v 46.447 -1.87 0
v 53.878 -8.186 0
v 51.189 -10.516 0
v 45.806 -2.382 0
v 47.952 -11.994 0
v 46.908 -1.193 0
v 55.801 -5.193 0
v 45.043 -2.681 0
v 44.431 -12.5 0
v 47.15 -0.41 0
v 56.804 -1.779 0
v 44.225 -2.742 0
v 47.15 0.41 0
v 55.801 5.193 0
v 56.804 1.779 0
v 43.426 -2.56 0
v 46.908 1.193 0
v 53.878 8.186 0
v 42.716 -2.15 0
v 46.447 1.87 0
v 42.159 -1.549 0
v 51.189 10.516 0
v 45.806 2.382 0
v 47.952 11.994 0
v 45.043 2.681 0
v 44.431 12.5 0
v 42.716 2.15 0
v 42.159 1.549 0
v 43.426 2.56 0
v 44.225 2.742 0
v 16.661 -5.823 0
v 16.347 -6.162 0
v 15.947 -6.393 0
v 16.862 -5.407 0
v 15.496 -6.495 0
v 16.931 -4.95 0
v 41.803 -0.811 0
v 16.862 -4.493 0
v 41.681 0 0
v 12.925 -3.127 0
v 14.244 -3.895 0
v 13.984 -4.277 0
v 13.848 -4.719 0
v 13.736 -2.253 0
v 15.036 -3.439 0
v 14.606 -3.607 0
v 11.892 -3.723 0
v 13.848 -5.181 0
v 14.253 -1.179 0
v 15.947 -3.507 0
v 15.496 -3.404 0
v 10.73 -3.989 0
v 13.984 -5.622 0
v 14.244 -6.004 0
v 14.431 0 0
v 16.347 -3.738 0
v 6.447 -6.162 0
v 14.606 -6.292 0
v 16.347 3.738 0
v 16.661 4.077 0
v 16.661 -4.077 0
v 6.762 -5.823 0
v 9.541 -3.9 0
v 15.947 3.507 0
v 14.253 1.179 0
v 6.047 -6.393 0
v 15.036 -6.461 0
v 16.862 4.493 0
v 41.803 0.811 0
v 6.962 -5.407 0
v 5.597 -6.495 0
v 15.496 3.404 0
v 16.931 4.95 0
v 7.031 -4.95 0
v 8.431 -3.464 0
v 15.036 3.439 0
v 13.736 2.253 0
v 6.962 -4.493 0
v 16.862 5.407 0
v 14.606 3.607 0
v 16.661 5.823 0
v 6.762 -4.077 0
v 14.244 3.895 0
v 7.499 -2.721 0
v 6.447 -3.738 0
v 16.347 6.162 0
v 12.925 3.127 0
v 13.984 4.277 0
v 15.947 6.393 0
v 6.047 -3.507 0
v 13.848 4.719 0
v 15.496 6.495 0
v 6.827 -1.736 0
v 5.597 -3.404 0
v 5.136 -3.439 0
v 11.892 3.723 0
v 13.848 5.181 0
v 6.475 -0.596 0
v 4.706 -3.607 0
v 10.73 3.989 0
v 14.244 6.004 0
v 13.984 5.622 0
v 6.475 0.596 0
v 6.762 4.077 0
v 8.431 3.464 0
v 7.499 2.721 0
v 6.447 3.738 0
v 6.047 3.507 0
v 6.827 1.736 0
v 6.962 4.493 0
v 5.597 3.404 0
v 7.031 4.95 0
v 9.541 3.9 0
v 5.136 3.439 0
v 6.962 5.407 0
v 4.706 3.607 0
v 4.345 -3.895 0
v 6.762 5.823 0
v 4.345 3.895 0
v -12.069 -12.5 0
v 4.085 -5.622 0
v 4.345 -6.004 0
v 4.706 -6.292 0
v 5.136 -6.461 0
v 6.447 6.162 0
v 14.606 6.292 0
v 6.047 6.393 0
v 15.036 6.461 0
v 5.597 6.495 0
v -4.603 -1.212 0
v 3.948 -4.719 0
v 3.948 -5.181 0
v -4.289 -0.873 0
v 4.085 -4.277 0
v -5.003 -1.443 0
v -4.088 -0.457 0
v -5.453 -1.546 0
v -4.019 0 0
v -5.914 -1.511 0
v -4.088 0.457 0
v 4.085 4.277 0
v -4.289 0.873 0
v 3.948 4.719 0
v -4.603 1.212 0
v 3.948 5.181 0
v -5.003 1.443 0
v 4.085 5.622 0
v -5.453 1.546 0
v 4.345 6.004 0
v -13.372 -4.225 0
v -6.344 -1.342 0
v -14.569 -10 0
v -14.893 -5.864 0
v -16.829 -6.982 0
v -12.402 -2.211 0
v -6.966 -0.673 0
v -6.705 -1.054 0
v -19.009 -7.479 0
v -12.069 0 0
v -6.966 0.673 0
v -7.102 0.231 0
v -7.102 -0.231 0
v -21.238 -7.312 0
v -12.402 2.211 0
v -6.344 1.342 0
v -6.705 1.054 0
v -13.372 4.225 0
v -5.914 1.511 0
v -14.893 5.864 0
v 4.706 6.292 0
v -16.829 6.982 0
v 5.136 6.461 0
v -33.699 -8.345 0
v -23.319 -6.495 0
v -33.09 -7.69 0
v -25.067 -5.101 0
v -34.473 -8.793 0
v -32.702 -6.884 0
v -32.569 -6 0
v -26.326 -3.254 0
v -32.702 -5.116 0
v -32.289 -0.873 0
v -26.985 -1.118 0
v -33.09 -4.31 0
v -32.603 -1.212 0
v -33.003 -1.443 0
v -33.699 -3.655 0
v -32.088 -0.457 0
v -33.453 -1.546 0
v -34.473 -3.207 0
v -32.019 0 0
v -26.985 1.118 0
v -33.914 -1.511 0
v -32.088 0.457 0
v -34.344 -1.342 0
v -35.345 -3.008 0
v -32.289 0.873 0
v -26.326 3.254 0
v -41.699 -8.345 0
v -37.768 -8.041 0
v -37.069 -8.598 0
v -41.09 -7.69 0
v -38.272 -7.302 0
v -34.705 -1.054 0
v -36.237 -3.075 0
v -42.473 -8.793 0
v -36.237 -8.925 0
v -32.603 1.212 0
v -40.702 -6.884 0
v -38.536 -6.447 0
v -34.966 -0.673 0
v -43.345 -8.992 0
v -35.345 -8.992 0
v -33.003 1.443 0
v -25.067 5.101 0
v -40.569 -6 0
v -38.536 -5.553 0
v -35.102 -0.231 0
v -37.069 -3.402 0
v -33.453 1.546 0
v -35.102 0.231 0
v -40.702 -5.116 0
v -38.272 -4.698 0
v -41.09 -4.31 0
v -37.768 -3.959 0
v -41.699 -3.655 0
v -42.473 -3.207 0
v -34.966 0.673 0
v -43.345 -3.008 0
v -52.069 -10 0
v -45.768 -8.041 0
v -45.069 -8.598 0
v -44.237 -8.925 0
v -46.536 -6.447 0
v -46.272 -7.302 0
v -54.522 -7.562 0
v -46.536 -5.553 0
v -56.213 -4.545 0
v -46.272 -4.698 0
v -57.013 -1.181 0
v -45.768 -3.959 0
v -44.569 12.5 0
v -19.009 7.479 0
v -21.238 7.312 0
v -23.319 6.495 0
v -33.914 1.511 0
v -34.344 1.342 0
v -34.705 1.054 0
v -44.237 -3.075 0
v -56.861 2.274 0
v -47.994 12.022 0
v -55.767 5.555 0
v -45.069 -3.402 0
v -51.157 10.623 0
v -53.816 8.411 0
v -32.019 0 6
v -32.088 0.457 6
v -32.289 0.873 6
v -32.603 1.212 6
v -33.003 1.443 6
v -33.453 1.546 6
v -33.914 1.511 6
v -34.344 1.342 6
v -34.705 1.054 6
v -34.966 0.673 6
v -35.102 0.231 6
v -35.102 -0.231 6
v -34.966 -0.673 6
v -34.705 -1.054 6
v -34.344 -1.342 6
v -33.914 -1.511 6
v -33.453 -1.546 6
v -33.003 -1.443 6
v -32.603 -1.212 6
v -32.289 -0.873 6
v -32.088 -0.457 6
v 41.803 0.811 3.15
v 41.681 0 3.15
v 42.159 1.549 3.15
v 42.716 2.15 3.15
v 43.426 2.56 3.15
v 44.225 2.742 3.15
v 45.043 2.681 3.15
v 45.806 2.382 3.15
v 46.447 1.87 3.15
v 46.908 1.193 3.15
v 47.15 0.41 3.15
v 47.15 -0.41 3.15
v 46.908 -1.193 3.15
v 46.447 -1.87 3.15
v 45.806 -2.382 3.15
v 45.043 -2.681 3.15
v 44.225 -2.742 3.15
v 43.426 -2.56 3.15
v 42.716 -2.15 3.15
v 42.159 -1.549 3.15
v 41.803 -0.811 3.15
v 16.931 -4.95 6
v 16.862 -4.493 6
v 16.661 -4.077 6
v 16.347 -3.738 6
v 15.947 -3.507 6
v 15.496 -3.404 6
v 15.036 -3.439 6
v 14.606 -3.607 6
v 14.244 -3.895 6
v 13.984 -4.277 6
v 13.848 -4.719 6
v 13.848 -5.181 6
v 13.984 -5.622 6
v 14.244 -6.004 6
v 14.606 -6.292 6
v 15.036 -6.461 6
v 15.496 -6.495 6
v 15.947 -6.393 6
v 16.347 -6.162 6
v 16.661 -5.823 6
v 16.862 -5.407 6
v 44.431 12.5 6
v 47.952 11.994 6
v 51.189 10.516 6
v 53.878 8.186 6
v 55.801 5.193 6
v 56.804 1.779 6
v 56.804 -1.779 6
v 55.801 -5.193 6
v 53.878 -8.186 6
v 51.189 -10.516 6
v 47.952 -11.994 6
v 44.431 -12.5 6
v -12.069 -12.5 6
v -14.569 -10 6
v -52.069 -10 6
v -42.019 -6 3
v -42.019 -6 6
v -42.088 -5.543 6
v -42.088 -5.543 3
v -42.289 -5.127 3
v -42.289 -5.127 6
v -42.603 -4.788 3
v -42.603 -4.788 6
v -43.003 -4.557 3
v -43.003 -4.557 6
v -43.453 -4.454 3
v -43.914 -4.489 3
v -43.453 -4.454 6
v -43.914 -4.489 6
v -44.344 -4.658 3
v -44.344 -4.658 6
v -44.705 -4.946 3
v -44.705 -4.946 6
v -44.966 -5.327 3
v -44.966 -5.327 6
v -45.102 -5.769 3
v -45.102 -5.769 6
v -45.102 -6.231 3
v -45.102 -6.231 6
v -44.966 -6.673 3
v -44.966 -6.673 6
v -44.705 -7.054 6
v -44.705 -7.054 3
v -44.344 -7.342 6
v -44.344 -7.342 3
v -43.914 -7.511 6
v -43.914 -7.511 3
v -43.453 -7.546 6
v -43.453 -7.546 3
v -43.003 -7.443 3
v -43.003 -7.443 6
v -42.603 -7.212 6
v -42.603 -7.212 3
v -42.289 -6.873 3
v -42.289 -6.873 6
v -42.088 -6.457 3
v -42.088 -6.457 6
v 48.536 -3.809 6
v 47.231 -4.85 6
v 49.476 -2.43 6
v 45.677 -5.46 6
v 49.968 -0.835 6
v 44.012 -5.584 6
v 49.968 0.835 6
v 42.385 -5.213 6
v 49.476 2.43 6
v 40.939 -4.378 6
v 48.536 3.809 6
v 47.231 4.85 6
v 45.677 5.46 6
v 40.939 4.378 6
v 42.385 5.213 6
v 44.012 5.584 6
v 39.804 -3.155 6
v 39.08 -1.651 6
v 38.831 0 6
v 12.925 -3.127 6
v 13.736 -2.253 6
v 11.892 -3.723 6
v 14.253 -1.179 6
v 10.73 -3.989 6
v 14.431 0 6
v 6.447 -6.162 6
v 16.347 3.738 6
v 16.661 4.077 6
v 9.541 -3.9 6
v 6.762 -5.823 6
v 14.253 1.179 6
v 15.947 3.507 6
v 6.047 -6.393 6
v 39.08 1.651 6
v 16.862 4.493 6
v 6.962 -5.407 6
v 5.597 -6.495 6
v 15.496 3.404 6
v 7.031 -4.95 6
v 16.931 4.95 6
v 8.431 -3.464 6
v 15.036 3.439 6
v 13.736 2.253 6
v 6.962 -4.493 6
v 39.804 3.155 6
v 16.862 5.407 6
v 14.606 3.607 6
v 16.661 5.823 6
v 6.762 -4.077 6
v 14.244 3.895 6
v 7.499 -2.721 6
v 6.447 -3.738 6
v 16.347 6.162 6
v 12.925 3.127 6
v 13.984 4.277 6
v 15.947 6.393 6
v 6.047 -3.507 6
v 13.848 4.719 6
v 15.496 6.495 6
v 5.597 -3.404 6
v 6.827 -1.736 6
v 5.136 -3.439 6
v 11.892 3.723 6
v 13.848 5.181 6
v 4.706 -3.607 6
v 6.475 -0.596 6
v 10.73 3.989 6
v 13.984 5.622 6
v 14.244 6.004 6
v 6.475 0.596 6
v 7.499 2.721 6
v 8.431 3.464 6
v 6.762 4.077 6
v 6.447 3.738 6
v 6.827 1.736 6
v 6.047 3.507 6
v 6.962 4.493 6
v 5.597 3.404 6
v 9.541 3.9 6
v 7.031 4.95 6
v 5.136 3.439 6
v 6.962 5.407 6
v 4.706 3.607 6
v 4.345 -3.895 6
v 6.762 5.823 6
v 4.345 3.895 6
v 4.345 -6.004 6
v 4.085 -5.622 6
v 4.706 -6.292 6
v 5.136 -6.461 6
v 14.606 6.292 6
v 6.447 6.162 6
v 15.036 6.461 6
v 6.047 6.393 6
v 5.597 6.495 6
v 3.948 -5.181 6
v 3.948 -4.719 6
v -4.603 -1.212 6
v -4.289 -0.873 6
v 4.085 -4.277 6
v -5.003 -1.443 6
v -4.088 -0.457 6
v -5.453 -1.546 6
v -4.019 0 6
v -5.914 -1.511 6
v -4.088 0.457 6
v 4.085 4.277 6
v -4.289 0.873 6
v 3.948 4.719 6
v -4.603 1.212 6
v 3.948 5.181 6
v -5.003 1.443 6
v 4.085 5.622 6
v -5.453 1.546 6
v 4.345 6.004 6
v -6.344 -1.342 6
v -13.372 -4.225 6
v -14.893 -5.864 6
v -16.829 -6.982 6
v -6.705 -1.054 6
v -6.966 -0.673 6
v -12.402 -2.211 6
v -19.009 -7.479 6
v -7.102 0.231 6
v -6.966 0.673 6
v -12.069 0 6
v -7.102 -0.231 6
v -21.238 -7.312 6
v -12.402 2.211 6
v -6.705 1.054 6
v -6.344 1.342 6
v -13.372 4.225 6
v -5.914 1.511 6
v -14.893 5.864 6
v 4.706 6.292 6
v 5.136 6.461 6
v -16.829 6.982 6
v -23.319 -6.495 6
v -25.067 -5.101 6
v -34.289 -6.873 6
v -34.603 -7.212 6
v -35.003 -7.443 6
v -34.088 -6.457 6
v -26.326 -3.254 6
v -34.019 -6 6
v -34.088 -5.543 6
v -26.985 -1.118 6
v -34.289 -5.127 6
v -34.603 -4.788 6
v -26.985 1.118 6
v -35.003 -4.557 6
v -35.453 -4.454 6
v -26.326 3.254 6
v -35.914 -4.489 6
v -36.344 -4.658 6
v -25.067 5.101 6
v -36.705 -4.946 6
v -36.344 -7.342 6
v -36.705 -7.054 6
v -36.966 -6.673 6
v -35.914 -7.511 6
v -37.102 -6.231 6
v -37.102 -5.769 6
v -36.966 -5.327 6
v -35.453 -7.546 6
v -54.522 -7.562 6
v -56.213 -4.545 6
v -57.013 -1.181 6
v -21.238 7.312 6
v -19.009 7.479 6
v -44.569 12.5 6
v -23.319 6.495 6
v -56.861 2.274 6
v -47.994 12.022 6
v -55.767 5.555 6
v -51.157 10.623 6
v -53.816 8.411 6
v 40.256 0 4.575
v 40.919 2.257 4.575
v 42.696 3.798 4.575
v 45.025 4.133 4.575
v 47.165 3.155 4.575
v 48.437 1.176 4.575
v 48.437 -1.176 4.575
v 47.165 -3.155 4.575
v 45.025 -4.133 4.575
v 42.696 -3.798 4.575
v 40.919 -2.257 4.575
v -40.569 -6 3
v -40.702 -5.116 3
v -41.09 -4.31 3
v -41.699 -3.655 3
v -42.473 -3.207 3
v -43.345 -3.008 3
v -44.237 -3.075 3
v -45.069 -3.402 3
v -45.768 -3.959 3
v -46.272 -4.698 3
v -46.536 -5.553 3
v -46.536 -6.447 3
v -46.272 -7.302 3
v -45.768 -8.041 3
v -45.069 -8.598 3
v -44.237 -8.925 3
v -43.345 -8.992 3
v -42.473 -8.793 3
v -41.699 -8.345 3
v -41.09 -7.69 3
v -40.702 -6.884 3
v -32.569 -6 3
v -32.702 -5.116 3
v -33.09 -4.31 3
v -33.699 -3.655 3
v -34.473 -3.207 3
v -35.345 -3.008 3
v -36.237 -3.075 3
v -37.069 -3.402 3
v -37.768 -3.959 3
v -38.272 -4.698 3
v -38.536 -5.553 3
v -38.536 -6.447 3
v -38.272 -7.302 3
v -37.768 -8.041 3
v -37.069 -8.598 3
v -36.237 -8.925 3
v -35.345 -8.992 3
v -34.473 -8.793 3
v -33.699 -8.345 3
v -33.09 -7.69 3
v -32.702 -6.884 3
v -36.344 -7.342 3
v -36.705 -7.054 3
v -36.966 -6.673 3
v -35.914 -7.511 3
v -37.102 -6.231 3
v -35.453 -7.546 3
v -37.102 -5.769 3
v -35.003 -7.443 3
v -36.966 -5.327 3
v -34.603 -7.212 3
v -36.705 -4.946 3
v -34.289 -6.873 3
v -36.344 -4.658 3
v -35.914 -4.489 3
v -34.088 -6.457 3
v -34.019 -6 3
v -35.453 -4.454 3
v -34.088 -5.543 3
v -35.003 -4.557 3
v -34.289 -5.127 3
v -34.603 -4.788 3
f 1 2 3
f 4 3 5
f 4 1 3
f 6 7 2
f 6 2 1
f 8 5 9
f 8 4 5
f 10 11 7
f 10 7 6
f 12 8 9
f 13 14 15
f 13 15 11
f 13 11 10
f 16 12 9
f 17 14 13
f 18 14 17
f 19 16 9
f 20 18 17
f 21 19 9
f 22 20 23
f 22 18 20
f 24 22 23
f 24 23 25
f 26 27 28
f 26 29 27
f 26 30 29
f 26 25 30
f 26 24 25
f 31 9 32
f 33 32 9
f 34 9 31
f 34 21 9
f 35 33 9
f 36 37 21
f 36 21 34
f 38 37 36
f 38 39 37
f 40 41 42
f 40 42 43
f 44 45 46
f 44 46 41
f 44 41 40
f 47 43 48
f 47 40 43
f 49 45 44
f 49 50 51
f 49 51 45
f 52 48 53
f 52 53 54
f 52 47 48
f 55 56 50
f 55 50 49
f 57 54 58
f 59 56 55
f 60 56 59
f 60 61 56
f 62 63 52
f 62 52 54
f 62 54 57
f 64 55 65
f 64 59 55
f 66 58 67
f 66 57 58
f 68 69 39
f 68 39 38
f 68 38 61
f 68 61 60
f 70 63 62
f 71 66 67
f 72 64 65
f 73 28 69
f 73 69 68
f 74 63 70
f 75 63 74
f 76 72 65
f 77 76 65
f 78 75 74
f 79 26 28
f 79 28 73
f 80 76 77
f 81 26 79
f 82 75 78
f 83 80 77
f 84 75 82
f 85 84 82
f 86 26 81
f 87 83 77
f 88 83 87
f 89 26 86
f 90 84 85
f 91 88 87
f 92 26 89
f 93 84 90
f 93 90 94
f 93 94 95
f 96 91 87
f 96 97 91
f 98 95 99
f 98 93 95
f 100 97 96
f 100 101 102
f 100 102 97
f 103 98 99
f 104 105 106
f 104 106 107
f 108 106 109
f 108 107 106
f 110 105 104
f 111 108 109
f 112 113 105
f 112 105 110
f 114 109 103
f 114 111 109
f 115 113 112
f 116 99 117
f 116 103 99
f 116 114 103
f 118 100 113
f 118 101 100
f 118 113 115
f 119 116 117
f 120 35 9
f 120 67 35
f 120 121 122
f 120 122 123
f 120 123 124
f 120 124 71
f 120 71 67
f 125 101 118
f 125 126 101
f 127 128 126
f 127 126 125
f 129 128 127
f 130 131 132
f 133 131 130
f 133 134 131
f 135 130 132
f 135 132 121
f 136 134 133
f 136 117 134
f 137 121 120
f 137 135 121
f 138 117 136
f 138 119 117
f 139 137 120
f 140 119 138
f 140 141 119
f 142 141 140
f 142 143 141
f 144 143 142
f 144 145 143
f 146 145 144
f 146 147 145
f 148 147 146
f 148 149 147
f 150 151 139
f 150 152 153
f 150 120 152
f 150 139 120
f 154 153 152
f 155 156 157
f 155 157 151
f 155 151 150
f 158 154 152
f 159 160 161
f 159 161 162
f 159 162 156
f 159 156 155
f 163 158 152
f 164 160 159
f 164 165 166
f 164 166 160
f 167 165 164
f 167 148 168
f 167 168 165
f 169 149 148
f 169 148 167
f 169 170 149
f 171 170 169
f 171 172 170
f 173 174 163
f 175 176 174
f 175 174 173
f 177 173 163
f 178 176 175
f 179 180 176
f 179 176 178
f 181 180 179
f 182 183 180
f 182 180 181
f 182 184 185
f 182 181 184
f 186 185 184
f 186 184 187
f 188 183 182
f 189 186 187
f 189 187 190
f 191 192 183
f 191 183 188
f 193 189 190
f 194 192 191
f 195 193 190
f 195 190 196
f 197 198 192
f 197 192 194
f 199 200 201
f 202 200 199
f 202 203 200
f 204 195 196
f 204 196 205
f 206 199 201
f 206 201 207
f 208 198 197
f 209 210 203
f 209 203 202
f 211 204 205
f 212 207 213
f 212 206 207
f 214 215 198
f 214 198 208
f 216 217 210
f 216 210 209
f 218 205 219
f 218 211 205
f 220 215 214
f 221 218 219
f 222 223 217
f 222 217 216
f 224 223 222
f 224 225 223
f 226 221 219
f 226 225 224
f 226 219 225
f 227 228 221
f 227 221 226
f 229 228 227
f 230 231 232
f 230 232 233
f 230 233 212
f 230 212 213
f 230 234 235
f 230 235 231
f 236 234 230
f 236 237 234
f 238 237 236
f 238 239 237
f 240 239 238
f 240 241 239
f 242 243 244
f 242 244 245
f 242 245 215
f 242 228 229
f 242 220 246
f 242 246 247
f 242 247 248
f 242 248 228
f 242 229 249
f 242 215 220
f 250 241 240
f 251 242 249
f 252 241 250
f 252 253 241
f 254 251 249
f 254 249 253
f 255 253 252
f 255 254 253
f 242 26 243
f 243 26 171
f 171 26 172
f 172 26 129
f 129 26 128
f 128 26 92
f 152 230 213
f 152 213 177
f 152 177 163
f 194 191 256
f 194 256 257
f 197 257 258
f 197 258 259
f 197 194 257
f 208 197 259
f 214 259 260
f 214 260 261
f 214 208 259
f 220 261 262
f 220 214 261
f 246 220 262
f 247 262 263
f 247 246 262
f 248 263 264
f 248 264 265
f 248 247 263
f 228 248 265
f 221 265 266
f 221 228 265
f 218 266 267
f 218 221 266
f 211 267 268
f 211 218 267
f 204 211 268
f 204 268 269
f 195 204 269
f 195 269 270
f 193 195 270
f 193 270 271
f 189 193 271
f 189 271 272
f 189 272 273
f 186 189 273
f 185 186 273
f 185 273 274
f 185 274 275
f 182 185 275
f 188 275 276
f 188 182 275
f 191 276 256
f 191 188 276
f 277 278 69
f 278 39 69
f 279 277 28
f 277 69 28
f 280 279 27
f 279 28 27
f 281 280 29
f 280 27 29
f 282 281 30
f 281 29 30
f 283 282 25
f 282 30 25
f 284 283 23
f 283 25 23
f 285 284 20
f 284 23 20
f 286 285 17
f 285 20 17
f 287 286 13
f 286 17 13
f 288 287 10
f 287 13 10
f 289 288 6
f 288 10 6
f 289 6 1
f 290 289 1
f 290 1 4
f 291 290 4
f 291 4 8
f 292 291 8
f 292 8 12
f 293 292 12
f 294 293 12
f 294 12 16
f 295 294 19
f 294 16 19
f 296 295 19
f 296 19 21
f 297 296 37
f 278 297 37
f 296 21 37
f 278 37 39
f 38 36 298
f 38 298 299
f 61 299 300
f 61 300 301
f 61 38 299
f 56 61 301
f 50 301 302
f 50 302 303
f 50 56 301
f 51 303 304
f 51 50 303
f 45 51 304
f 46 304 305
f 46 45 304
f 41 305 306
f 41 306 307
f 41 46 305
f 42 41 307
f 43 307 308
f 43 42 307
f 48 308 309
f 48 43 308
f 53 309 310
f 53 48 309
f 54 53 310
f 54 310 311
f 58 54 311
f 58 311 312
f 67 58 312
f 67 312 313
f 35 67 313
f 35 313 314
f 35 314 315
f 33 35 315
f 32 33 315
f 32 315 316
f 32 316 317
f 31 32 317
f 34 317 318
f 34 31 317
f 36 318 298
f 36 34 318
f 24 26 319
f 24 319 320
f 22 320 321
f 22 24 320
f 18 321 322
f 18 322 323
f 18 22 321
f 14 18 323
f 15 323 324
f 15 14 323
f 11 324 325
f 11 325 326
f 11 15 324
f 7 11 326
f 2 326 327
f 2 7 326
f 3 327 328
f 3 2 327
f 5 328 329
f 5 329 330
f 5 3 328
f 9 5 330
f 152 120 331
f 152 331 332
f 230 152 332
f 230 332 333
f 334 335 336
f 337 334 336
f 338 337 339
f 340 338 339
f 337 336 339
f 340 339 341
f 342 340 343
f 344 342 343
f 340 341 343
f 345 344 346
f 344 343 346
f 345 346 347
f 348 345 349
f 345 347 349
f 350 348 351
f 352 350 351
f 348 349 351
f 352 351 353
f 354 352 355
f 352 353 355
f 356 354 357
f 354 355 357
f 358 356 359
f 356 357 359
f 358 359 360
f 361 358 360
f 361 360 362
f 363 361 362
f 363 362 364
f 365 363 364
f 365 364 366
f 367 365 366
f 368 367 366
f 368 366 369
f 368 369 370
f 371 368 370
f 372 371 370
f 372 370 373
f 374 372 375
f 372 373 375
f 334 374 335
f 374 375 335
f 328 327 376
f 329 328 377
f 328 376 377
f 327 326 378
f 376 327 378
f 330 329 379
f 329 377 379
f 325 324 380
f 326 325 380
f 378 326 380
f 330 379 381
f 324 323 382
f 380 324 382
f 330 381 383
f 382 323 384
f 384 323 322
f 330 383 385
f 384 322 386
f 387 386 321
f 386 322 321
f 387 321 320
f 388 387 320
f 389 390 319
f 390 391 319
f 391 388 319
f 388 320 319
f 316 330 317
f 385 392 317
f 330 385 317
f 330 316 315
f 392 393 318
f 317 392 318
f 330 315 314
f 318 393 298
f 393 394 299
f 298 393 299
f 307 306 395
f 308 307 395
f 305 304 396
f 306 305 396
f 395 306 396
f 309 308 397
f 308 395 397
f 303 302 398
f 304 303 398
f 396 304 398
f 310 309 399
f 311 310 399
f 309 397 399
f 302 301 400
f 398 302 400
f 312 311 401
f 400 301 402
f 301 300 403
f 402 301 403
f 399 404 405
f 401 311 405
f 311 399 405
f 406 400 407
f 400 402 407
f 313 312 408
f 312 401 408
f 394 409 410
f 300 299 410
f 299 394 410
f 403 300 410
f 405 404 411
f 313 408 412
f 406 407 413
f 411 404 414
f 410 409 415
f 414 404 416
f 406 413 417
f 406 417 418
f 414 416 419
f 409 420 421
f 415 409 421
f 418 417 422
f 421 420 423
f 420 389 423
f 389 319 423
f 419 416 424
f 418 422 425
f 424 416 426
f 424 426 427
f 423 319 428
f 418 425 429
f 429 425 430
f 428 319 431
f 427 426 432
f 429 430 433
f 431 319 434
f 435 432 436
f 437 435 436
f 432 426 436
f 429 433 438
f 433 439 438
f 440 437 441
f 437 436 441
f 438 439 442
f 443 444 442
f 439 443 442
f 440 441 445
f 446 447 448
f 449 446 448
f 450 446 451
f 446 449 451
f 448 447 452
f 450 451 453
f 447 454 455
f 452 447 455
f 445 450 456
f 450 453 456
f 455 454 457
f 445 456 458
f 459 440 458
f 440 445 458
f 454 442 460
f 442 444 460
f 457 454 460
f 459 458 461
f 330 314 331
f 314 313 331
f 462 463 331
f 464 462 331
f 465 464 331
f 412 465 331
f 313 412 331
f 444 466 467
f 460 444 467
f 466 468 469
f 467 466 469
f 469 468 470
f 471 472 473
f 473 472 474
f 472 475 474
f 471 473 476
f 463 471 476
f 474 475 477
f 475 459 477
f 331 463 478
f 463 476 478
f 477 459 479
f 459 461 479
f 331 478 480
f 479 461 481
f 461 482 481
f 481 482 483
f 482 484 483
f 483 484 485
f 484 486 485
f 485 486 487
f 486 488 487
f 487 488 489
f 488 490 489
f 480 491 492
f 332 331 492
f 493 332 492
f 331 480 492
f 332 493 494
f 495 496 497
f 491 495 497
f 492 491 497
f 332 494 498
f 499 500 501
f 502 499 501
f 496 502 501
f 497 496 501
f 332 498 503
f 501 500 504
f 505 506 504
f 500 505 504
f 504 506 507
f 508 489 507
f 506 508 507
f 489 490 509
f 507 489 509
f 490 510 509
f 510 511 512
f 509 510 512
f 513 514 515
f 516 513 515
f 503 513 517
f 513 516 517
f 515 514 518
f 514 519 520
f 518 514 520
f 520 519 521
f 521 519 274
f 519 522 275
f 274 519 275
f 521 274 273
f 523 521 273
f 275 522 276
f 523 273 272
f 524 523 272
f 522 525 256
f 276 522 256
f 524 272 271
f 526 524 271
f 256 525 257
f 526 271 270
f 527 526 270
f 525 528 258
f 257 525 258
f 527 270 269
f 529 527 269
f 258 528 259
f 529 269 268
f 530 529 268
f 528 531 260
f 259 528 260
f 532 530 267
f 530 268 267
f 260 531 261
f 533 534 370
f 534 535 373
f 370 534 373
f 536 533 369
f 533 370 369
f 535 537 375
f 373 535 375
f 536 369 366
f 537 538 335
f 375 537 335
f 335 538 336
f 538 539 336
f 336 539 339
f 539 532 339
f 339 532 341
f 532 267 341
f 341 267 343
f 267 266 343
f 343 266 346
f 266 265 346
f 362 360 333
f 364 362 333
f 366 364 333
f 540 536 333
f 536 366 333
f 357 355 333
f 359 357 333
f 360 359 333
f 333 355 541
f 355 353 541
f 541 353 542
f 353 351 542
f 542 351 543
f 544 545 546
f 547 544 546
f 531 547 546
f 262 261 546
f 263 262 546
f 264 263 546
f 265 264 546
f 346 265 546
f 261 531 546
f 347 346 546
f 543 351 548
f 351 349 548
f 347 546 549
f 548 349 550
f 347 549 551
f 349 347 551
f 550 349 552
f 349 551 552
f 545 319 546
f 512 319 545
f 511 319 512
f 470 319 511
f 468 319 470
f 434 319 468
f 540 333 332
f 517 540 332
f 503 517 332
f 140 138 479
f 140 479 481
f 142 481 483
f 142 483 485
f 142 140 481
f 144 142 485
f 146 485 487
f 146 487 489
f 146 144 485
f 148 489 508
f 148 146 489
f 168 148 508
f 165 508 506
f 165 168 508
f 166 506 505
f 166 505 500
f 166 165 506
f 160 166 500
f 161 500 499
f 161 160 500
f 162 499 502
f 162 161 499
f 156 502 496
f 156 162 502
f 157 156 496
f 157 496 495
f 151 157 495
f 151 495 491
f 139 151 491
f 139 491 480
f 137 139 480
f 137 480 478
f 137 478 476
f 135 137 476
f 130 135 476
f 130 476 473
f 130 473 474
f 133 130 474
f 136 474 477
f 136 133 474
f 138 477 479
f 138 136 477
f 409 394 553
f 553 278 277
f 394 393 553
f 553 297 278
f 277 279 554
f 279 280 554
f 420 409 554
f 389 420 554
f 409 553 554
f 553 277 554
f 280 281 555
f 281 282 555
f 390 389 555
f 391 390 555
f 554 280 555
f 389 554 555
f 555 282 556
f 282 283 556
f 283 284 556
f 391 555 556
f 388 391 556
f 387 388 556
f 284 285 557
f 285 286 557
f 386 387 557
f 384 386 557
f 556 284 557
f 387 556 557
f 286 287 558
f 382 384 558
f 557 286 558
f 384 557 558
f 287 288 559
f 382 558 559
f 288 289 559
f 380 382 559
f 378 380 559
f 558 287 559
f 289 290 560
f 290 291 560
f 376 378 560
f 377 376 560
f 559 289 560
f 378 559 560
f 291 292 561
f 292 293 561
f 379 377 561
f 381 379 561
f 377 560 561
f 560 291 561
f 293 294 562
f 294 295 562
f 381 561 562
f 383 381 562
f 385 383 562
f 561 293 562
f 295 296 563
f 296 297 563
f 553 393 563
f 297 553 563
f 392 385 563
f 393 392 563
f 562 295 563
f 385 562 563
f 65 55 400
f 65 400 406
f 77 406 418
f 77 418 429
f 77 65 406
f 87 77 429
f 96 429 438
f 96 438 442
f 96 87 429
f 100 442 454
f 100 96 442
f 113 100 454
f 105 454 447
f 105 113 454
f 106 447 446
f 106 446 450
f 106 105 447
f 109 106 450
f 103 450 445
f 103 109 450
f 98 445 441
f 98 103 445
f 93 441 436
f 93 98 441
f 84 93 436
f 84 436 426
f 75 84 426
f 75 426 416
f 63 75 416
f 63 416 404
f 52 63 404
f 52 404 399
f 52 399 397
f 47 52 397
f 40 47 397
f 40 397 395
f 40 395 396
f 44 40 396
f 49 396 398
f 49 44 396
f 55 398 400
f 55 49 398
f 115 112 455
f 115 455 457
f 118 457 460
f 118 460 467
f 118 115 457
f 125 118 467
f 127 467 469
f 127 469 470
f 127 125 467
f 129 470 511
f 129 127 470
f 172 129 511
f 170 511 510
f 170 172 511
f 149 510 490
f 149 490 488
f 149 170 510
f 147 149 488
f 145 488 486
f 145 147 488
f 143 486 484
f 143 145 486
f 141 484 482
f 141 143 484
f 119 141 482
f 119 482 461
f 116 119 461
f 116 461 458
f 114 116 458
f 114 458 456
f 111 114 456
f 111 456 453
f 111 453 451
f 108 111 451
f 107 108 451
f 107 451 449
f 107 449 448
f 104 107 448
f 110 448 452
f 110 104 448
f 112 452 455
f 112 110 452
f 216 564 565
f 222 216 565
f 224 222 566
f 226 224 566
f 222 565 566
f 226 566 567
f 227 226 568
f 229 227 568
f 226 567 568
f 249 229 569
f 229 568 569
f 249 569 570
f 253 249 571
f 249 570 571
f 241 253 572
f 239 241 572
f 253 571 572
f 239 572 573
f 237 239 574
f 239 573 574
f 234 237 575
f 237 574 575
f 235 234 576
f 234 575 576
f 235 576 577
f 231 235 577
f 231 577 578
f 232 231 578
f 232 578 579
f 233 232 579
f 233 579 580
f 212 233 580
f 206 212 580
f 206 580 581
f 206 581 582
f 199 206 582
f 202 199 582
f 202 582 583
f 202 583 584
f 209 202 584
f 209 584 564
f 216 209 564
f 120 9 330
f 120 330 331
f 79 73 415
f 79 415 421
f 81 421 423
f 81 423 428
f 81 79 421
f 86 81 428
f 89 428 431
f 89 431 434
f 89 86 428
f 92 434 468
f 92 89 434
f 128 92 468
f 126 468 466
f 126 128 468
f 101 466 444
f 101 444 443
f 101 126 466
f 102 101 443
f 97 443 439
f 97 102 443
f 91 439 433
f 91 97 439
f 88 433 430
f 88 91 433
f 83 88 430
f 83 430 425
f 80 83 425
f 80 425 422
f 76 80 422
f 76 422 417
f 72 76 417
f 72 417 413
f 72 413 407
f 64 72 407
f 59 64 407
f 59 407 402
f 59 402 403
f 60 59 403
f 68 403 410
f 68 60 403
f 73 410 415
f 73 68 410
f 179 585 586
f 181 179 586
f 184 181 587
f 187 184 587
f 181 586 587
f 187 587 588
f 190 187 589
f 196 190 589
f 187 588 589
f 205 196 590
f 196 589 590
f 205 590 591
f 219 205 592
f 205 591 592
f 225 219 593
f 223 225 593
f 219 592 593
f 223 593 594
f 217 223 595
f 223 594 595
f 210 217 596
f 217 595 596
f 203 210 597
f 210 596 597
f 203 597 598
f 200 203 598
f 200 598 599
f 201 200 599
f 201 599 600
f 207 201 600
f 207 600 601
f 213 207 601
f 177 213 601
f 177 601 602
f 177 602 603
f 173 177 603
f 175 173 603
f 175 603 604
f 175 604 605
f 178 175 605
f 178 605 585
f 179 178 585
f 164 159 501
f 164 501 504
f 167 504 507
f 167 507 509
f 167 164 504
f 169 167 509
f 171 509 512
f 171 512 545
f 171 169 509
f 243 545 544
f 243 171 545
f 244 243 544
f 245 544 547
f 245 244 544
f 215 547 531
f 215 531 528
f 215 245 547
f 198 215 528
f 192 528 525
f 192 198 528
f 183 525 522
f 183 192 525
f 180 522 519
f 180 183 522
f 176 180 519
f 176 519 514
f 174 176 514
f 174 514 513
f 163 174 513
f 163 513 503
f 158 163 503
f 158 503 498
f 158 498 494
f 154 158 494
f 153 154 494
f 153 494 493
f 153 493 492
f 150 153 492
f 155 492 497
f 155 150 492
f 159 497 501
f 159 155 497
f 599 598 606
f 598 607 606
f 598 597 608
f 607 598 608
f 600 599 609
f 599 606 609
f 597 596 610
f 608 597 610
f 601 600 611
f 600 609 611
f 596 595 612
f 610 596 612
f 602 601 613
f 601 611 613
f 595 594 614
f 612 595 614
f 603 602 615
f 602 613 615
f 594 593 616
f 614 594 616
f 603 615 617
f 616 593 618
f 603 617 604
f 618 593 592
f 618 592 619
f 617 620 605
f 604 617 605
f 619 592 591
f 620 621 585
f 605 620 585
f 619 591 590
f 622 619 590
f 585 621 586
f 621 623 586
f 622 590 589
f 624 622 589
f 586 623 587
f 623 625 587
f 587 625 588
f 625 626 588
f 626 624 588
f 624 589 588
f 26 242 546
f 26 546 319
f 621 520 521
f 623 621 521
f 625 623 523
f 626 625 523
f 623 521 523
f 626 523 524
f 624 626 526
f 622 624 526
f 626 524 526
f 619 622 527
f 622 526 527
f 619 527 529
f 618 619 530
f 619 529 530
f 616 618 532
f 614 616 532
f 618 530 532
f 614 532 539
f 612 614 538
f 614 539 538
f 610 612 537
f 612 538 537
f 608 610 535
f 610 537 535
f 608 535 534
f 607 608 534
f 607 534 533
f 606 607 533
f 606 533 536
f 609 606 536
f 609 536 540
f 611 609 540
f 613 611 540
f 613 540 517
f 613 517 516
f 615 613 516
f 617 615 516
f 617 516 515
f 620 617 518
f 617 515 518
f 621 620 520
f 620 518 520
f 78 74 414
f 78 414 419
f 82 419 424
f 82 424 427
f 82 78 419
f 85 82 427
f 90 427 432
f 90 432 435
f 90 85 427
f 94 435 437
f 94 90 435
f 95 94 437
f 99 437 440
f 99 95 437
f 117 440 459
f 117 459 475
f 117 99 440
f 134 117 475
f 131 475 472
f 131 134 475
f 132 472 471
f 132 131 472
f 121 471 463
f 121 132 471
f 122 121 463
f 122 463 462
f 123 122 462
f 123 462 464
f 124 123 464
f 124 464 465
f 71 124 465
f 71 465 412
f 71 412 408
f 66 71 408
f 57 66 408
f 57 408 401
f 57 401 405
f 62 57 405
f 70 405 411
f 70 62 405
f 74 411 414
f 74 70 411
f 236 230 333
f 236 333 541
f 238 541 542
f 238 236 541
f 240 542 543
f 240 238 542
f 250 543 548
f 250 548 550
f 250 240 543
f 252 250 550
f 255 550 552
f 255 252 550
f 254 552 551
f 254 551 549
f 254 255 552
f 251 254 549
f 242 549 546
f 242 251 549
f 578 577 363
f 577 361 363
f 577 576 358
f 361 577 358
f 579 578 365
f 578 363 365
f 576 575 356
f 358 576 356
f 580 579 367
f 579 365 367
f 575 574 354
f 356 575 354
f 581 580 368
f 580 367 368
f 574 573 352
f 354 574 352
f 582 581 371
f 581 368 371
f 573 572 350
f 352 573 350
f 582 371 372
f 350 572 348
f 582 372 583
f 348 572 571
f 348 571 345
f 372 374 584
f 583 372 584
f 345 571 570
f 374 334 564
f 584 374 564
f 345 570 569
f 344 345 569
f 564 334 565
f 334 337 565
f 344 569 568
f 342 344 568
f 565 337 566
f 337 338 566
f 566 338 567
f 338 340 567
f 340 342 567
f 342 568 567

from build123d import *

# Parameters (mm, degrees)
SKETCH2_R                     = 4
SKETCH2_R_2                   = 1.55
SKETCH2_R_3                   = 7.5
BOSS_EXTRUDE1_DEPTH           = 6
CSK_FOR_M5_SFHCS1_D           = 5.5
CSK_FOR_M5_SFHCS1_CSINK_D     = 11.2
CSK_FOR_M5_SFHCS1_CSINK_ANGLE = 90
SKETCH6_R                     = 1.55
CUT_EXTRUDE1_DEPTH            = 3
SKETCH7_R                     = 3
CUT_EXTRUDE2_DEPTH            = 59.49909717


with BuildPart() as part:
    # Sketch2 → Boss-Extrude1 (new body)
    with BuildSketch(Plane.XY):
        with BuildLine():
            Line((-44.569206843, 12.5), (44.430793157, 12.5))
            ThreePointArc((44.430793157, 12.5), (56.930793157, 0), (44.430793157, -12.5))
            Line((44.430793157, -12.5), (-12.069206843, -12.5))
            Line((-12.069206843, -12.5), (-14.569206843, -10))
            Line((-14.569206843, -10), (-52.069206843, -10))
            ThreePointArc((-52.069206843, -10), (-56.427748069, 3.952847075), (-44.569206843, 12.5))
        make_face()
        with Locations((10.430793157, 0)):
            Circle(SKETCH2_R, mode=Mode.SUBTRACT)
        with Locations((15.380540625, 4.949747468)):
            Circle(SKETCH2_R_2, mode=Mode.SUBTRACT)
        with Locations((15.380540625, -4.949747468)):
            Circle(SKETCH2_R_2, mode=Mode.SUBTRACT)
        with Locations((5.481045689, -4.949747468)):
            Circle(SKETCH2_R_2, mode=Mode.SUBTRACT)
        with Locations((5.481045689, 4.949747468)):
            Circle(SKETCH2_R_2, mode=Mode.SUBTRACT)
        with Locations((-19.569206843, 0)):
            Circle(SKETCH2_R_3, mode=Mode.SUBTRACT)
        with Locations((-5.569206843, 0)):
            Circle(SKETCH2_R_2, mode=Mode.SUBTRACT)
        with Locations((-33.569206843, 0)):
            Circle(SKETCH2_R_2, mode=Mode.SUBTRACT)
    extrude(amount=BOSS_EXTRUDE1_DEPTH)

    # CSK for M5 SFHCS1 (through all)
    with Locations(Plane(origin=(44.430793157, 0, 6), x_dir=(1, 0, 0), z_dir=(0, 0, 1))):
        with Locations((0, 0)):
            CounterSinkHole(CSK_FOR_M5_SFHCS1_D / 2, CSK_FOR_M5_SFHCS1_CSINK_D / 2, counter_sink_angle=CSK_FOR_M5_SFHCS1_CSINK_ANGLE)

    # Sketch6 → Cut-Extrude1 (cut)
    with BuildSketch(Plane.XY.offset(6)):
        with Locations((-35.569206843, -6)):
            Circle(SKETCH6_R)
        with Locations((-43.569206843, -6)):
            Circle(SKETCH6_R)
    extrude(amount=-CUT_EXTRUDE1_DEPTH, mode=Mode.SUBTRACT)

    # Sketch7 → Cut-Extrude2 (cut, through all)
    with BuildSketch(Plane.XY.offset(3)):
        with Locations((-35.569206843, -6)):
            Circle(SKETCH7_R)
        with Locations((-43.569206843, -6)):
            Circle(SKETCH7_R)
    extrude(amount=-CUT_EXTRUDE2_DEPTH, mode=Mode.SUBTRACT)


solid = part.part
